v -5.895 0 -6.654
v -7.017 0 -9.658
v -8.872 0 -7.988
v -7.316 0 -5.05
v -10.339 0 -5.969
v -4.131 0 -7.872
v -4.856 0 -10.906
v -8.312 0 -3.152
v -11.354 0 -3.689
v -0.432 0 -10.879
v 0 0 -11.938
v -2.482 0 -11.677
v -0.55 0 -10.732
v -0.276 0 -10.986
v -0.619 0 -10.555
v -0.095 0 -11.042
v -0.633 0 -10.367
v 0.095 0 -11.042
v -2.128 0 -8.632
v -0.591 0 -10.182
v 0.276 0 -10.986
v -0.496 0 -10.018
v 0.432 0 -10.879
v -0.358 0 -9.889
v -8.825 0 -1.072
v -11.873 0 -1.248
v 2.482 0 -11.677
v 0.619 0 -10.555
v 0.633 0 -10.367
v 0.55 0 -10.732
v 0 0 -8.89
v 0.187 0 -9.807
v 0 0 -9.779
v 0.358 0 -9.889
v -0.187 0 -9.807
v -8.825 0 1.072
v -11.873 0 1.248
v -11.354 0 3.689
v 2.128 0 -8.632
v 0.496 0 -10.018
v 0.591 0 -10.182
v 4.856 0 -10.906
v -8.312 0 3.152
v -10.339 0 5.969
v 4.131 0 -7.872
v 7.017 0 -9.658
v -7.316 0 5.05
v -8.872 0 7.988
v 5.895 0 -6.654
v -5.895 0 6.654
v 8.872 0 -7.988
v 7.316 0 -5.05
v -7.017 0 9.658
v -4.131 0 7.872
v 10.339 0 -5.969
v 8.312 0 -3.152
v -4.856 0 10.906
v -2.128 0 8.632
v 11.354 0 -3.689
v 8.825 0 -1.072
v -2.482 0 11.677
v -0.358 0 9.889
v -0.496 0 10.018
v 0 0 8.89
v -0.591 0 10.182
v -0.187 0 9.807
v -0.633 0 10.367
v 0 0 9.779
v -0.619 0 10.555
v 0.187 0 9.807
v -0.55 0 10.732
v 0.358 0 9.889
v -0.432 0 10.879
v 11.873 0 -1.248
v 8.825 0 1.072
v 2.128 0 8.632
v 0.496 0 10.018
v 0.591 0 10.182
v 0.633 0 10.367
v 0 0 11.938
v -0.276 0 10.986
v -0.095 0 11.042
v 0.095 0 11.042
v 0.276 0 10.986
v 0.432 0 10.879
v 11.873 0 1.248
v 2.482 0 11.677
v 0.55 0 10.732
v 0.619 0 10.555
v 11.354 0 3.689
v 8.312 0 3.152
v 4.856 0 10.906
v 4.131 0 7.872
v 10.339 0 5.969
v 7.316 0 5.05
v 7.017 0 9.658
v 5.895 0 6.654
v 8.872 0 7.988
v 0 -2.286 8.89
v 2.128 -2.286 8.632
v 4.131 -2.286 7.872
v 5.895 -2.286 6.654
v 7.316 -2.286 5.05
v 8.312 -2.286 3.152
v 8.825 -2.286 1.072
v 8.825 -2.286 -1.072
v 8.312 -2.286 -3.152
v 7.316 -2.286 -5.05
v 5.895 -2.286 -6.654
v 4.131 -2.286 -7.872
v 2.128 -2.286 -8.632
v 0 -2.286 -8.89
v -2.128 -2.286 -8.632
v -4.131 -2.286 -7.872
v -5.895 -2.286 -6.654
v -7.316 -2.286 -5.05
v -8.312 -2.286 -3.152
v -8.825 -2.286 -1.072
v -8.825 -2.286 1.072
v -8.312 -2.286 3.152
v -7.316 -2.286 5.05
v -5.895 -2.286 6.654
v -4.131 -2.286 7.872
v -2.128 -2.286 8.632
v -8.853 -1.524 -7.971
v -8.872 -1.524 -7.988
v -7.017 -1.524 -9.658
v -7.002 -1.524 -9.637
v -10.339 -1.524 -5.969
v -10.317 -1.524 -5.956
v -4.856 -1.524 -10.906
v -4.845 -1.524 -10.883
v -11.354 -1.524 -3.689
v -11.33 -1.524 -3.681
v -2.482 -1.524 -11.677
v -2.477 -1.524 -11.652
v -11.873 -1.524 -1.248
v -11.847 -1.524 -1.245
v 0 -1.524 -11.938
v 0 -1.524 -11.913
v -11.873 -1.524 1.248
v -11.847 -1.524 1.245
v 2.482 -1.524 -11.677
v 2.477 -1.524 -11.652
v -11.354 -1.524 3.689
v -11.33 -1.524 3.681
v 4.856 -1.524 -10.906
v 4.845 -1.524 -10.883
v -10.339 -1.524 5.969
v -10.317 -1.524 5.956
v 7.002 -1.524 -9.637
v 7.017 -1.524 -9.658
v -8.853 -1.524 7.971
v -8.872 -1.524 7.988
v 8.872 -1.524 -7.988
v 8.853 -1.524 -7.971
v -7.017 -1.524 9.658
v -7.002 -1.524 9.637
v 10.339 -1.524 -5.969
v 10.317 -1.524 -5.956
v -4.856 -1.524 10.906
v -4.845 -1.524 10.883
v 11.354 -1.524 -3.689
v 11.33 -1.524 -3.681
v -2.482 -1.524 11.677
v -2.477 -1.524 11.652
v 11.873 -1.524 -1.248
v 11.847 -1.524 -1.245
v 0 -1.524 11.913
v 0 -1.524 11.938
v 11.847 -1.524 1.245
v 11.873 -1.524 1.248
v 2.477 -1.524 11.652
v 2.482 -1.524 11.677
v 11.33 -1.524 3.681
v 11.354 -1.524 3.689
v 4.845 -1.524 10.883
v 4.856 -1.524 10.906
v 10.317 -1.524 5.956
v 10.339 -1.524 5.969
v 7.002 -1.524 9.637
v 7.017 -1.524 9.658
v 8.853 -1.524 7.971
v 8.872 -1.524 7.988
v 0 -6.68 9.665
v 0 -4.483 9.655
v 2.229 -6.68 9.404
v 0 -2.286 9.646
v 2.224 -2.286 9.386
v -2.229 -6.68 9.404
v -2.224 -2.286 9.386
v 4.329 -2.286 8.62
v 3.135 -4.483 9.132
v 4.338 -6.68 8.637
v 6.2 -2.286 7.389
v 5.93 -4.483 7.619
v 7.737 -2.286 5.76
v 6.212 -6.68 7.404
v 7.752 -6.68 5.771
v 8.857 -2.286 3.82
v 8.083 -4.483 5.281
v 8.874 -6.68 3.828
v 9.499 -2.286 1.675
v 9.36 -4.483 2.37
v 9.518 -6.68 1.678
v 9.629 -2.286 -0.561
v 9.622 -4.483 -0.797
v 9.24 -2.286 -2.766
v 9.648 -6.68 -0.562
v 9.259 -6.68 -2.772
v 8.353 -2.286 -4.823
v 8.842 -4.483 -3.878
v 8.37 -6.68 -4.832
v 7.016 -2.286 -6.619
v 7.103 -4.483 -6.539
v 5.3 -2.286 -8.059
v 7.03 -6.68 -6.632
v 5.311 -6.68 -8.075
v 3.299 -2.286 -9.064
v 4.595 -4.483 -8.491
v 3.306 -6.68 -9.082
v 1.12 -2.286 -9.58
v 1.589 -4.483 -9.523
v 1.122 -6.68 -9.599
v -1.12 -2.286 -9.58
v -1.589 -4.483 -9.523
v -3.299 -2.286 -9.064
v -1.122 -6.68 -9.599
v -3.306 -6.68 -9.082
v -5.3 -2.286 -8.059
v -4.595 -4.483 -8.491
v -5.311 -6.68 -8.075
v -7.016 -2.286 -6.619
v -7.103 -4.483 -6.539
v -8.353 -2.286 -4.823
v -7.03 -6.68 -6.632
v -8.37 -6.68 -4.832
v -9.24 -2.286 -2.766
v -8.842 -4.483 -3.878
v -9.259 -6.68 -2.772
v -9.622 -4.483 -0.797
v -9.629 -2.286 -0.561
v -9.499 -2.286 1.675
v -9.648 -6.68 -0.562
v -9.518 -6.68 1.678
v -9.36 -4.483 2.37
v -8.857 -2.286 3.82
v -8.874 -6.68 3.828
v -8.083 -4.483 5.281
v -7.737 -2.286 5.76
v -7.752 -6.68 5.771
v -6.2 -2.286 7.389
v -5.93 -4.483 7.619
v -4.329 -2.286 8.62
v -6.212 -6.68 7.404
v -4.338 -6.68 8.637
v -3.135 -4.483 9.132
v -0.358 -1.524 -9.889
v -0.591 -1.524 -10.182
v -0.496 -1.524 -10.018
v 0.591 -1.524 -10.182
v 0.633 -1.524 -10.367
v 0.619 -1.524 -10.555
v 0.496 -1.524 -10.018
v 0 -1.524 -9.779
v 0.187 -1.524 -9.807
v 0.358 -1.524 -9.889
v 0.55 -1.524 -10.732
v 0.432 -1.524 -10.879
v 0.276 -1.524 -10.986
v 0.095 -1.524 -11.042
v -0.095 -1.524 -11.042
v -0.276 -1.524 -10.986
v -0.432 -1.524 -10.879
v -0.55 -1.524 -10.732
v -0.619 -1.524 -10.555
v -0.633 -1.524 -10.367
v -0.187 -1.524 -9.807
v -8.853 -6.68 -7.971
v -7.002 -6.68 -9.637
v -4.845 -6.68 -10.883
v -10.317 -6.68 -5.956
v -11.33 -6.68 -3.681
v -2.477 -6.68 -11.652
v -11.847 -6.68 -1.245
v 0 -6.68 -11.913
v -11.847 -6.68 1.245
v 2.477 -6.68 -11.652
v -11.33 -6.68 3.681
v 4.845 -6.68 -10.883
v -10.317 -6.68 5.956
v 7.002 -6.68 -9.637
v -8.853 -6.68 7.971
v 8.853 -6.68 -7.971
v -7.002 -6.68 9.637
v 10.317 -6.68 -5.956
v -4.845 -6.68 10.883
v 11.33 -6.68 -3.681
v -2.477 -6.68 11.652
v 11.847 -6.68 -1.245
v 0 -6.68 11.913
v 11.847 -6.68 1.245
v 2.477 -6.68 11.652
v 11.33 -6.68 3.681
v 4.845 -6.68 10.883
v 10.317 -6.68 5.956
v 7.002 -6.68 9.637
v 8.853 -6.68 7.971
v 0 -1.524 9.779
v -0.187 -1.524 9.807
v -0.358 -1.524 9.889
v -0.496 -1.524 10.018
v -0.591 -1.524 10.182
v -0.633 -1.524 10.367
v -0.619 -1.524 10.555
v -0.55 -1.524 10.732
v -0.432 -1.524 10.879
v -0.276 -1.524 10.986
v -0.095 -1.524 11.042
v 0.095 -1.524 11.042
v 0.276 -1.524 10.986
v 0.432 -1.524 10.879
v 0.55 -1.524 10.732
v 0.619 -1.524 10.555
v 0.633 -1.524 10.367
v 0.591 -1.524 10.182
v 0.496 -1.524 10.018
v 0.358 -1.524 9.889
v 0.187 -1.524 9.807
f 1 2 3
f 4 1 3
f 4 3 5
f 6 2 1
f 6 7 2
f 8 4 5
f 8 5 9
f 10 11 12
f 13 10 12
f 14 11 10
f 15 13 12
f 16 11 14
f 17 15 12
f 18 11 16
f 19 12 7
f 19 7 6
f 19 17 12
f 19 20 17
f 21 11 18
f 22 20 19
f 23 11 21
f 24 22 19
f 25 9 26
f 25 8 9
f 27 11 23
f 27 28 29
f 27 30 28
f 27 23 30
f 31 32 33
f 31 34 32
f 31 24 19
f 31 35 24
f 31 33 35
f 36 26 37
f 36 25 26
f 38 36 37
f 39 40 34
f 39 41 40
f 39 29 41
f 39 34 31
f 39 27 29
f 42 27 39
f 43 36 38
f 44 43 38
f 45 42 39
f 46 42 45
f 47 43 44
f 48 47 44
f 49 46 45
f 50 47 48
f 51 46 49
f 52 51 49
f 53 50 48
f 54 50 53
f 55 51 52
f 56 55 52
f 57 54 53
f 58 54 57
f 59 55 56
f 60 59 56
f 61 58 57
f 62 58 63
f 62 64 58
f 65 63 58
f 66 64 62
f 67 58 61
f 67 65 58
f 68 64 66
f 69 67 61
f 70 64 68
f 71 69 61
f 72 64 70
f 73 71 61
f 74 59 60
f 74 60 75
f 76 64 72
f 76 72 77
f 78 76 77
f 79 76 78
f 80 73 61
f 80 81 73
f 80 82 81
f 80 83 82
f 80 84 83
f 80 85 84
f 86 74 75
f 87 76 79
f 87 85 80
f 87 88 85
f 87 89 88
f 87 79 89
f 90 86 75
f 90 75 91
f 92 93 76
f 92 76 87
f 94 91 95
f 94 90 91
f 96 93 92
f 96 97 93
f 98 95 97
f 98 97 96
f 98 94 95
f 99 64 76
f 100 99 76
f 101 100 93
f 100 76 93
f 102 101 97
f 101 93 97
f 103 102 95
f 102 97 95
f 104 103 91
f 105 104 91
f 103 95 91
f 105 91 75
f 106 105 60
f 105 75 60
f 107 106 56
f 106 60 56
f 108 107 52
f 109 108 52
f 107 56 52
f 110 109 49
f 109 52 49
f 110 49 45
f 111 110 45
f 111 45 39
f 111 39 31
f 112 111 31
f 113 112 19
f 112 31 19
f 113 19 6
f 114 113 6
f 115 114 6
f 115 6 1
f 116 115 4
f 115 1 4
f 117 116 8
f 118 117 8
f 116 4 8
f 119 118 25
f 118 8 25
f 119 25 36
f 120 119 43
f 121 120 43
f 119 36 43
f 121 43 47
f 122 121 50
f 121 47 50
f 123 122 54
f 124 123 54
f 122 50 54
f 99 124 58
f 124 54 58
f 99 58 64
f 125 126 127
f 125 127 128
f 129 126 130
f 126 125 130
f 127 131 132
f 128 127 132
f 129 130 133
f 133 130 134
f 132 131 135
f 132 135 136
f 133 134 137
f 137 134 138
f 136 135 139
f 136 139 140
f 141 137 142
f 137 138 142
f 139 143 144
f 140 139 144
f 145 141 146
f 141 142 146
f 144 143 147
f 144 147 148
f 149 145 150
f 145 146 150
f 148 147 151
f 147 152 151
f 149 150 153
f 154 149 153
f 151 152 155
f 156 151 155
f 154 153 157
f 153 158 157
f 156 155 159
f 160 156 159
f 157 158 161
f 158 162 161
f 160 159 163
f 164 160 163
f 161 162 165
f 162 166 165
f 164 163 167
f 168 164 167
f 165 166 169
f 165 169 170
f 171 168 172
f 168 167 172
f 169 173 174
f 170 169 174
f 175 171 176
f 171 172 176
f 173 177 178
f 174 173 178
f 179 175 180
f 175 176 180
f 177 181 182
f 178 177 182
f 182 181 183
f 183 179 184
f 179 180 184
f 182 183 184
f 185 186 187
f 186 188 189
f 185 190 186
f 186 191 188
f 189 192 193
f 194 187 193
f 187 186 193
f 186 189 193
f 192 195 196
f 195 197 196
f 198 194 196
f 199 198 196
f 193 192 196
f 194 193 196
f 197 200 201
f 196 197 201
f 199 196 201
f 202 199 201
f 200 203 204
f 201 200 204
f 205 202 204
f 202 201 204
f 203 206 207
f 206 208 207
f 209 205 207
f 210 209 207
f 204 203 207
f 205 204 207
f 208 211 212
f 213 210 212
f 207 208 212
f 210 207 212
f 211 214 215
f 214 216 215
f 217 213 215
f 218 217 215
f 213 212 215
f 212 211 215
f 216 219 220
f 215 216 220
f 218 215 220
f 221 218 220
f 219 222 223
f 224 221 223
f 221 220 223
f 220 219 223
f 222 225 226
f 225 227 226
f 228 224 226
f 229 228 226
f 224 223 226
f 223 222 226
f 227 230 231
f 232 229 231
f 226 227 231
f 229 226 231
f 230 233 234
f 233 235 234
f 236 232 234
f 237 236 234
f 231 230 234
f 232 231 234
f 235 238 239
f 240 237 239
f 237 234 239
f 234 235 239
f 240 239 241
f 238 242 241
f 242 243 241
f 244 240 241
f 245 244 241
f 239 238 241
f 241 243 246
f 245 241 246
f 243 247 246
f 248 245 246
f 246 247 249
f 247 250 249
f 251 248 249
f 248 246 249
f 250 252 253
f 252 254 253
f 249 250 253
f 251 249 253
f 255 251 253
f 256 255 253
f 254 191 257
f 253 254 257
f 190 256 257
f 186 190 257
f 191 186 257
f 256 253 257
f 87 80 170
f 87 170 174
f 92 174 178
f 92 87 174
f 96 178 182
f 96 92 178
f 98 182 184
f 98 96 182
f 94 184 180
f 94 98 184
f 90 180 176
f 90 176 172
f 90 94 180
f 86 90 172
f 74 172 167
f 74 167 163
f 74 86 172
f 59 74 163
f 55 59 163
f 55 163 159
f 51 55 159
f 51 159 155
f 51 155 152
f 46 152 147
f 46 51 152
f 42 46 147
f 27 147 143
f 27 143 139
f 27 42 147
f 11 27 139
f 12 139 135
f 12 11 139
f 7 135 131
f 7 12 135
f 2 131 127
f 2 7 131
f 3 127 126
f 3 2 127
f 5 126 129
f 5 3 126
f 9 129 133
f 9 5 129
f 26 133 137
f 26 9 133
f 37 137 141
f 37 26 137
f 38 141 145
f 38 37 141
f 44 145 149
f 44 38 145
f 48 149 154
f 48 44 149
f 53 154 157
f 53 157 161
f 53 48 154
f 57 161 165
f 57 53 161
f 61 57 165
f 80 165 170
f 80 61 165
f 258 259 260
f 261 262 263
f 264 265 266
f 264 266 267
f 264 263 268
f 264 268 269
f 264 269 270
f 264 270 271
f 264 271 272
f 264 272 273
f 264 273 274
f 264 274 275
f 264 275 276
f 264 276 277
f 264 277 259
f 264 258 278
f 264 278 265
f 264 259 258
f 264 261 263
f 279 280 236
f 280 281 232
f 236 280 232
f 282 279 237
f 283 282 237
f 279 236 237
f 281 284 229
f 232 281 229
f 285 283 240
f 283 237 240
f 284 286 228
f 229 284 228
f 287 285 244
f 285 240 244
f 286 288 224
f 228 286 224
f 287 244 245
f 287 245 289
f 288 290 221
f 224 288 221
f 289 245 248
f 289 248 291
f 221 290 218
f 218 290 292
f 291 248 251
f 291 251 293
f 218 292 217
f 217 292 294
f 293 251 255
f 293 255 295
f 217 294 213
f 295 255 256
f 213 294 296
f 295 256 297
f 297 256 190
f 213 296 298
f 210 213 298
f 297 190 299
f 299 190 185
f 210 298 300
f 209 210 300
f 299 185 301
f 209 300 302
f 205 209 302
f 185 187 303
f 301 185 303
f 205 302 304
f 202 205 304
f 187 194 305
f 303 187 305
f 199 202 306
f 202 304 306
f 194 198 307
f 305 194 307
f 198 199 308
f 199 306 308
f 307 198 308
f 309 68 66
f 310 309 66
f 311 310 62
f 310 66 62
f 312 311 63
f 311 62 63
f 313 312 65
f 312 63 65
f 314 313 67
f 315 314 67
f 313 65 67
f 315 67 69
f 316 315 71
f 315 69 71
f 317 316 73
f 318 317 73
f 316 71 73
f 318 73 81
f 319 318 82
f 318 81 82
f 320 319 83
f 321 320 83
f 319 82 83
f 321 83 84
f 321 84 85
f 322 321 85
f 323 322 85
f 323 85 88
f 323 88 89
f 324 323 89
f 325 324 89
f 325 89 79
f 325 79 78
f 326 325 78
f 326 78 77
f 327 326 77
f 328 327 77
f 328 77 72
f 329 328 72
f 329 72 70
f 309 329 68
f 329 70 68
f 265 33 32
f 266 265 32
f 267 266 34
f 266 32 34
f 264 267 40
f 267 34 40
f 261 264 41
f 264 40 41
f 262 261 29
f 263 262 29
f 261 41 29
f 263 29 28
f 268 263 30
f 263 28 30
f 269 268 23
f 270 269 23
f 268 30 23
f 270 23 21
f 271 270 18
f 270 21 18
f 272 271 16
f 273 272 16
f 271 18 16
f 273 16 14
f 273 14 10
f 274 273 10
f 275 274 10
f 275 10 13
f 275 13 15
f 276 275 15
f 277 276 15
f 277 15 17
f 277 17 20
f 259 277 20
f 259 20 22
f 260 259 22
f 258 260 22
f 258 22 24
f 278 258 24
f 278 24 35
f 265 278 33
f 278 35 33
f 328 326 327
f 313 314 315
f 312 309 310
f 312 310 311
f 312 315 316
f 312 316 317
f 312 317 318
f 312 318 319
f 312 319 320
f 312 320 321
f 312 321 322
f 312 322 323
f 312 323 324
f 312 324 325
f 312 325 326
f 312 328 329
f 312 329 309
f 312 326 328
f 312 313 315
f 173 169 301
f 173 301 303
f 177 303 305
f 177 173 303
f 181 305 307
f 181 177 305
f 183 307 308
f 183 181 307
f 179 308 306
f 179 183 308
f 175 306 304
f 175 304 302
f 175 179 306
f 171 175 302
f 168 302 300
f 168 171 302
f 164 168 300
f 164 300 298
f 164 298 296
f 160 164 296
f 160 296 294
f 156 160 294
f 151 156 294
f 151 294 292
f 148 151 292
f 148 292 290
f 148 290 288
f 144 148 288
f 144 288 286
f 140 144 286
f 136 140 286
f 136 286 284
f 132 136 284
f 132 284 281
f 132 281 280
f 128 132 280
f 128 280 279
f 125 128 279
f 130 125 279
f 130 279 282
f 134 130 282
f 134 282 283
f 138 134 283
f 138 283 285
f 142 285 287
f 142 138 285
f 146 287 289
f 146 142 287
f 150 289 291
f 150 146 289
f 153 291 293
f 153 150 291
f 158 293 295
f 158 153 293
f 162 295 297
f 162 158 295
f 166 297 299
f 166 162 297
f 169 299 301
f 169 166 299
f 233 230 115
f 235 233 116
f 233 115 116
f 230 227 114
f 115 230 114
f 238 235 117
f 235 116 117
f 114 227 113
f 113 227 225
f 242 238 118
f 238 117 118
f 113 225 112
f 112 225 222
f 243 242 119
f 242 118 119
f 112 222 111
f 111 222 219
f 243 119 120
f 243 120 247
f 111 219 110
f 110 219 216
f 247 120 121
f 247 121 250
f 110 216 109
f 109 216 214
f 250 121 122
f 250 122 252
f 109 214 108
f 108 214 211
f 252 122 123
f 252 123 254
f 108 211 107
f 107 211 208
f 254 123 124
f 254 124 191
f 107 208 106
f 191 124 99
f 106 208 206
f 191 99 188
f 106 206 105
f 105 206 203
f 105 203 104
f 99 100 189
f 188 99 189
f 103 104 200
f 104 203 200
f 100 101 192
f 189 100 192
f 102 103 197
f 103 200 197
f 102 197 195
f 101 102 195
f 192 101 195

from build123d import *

# Parameters (mm, degrees)
SKETCH1_R         = 11.9126
SHAFT_DEPTH       = 6.6802
SKETCH4_R         = 11.938
CAP_DEPTH         = 1.524
SKETCH7_R         = 8.89
TOP_HOLE_DEPTH    = 2.286
SKETCH8_R         = 9.6647
BOTTOM_HOLE_DEPTH = 18.445362755
DRAFT1_ANGLE      = 0.25
SKETCH9_R         = 0.635
SIDE_HOLES_DEPTH  = 1.524


with BuildPart() as part:
    # Sketch1 → Shaft (new body)
    with BuildSketch(Plane(origin=(0, 0, 0), x_dir=(1, 0, 0), z_dir=(0, 1, 0))):
        Circle(SKETCH1_R)
    extrude(amount=-SHAFT_DEPTH)

    # Sketch4 → Cap (add)
    with BuildSketch(Plane(origin=(0, 0, 0), x_dir=(-1, 0, 0), z_dir=(0, 1, 0))):
        Circle(SKETCH4_R)
    extrude(amount=-CAP_DEPTH)

    # Sketch7 → Top Hole (cut)
    with BuildSketch(Plane(origin=(0, 0, 0), x_dir=(-1, 0, 0), z_dir=(0, 1, 0))):
        Circle(SKETCH7_R)
    extrude(amount=-TOP_HOLE_DEPTH, mode=Mode.SUBTRACT)

    # Sketch8 → Bottom Hole (cut, through all)
    with BuildSketch(Plane(origin=(0, -2.286, 0), x_dir=(-1, 0, 0), z_dir=(0, 1, 0))):
        Circle(SKETCH8_R)
    extrude(amount=-BOTTOM_HOLE_DEPTH, mode=Mode.SUBTRACT)

    # Draft1
    draft1_faces = [part.faces().sort_by_distance(p)[0] for p in [
        (9.6647, -4.4831, 0),
    ]]
    draft(draft1_faces, Plane(origin=(0, -6.6802, 0), x_dir=(0, 0, -1), z_dir=(0, -1, 0)), DRAFT1_ANGLE)

    # Sketch9 → Side Holes (cut)
    with BuildSketch(Plane(origin=(0, 0, 0), x_dir=(-1, 0, 0), z_dir=(0, 1, 0))):
        with Locations((0, -10.414)):
            Circle(SKETCH9_R)
        with Locations((0, 10.414)):
            Circle(SKETCH9_R)
    extrude(amount=-SIDE_HOLES_DEPTH, mode=Mode.SUBTRACT)


solid = part.part
